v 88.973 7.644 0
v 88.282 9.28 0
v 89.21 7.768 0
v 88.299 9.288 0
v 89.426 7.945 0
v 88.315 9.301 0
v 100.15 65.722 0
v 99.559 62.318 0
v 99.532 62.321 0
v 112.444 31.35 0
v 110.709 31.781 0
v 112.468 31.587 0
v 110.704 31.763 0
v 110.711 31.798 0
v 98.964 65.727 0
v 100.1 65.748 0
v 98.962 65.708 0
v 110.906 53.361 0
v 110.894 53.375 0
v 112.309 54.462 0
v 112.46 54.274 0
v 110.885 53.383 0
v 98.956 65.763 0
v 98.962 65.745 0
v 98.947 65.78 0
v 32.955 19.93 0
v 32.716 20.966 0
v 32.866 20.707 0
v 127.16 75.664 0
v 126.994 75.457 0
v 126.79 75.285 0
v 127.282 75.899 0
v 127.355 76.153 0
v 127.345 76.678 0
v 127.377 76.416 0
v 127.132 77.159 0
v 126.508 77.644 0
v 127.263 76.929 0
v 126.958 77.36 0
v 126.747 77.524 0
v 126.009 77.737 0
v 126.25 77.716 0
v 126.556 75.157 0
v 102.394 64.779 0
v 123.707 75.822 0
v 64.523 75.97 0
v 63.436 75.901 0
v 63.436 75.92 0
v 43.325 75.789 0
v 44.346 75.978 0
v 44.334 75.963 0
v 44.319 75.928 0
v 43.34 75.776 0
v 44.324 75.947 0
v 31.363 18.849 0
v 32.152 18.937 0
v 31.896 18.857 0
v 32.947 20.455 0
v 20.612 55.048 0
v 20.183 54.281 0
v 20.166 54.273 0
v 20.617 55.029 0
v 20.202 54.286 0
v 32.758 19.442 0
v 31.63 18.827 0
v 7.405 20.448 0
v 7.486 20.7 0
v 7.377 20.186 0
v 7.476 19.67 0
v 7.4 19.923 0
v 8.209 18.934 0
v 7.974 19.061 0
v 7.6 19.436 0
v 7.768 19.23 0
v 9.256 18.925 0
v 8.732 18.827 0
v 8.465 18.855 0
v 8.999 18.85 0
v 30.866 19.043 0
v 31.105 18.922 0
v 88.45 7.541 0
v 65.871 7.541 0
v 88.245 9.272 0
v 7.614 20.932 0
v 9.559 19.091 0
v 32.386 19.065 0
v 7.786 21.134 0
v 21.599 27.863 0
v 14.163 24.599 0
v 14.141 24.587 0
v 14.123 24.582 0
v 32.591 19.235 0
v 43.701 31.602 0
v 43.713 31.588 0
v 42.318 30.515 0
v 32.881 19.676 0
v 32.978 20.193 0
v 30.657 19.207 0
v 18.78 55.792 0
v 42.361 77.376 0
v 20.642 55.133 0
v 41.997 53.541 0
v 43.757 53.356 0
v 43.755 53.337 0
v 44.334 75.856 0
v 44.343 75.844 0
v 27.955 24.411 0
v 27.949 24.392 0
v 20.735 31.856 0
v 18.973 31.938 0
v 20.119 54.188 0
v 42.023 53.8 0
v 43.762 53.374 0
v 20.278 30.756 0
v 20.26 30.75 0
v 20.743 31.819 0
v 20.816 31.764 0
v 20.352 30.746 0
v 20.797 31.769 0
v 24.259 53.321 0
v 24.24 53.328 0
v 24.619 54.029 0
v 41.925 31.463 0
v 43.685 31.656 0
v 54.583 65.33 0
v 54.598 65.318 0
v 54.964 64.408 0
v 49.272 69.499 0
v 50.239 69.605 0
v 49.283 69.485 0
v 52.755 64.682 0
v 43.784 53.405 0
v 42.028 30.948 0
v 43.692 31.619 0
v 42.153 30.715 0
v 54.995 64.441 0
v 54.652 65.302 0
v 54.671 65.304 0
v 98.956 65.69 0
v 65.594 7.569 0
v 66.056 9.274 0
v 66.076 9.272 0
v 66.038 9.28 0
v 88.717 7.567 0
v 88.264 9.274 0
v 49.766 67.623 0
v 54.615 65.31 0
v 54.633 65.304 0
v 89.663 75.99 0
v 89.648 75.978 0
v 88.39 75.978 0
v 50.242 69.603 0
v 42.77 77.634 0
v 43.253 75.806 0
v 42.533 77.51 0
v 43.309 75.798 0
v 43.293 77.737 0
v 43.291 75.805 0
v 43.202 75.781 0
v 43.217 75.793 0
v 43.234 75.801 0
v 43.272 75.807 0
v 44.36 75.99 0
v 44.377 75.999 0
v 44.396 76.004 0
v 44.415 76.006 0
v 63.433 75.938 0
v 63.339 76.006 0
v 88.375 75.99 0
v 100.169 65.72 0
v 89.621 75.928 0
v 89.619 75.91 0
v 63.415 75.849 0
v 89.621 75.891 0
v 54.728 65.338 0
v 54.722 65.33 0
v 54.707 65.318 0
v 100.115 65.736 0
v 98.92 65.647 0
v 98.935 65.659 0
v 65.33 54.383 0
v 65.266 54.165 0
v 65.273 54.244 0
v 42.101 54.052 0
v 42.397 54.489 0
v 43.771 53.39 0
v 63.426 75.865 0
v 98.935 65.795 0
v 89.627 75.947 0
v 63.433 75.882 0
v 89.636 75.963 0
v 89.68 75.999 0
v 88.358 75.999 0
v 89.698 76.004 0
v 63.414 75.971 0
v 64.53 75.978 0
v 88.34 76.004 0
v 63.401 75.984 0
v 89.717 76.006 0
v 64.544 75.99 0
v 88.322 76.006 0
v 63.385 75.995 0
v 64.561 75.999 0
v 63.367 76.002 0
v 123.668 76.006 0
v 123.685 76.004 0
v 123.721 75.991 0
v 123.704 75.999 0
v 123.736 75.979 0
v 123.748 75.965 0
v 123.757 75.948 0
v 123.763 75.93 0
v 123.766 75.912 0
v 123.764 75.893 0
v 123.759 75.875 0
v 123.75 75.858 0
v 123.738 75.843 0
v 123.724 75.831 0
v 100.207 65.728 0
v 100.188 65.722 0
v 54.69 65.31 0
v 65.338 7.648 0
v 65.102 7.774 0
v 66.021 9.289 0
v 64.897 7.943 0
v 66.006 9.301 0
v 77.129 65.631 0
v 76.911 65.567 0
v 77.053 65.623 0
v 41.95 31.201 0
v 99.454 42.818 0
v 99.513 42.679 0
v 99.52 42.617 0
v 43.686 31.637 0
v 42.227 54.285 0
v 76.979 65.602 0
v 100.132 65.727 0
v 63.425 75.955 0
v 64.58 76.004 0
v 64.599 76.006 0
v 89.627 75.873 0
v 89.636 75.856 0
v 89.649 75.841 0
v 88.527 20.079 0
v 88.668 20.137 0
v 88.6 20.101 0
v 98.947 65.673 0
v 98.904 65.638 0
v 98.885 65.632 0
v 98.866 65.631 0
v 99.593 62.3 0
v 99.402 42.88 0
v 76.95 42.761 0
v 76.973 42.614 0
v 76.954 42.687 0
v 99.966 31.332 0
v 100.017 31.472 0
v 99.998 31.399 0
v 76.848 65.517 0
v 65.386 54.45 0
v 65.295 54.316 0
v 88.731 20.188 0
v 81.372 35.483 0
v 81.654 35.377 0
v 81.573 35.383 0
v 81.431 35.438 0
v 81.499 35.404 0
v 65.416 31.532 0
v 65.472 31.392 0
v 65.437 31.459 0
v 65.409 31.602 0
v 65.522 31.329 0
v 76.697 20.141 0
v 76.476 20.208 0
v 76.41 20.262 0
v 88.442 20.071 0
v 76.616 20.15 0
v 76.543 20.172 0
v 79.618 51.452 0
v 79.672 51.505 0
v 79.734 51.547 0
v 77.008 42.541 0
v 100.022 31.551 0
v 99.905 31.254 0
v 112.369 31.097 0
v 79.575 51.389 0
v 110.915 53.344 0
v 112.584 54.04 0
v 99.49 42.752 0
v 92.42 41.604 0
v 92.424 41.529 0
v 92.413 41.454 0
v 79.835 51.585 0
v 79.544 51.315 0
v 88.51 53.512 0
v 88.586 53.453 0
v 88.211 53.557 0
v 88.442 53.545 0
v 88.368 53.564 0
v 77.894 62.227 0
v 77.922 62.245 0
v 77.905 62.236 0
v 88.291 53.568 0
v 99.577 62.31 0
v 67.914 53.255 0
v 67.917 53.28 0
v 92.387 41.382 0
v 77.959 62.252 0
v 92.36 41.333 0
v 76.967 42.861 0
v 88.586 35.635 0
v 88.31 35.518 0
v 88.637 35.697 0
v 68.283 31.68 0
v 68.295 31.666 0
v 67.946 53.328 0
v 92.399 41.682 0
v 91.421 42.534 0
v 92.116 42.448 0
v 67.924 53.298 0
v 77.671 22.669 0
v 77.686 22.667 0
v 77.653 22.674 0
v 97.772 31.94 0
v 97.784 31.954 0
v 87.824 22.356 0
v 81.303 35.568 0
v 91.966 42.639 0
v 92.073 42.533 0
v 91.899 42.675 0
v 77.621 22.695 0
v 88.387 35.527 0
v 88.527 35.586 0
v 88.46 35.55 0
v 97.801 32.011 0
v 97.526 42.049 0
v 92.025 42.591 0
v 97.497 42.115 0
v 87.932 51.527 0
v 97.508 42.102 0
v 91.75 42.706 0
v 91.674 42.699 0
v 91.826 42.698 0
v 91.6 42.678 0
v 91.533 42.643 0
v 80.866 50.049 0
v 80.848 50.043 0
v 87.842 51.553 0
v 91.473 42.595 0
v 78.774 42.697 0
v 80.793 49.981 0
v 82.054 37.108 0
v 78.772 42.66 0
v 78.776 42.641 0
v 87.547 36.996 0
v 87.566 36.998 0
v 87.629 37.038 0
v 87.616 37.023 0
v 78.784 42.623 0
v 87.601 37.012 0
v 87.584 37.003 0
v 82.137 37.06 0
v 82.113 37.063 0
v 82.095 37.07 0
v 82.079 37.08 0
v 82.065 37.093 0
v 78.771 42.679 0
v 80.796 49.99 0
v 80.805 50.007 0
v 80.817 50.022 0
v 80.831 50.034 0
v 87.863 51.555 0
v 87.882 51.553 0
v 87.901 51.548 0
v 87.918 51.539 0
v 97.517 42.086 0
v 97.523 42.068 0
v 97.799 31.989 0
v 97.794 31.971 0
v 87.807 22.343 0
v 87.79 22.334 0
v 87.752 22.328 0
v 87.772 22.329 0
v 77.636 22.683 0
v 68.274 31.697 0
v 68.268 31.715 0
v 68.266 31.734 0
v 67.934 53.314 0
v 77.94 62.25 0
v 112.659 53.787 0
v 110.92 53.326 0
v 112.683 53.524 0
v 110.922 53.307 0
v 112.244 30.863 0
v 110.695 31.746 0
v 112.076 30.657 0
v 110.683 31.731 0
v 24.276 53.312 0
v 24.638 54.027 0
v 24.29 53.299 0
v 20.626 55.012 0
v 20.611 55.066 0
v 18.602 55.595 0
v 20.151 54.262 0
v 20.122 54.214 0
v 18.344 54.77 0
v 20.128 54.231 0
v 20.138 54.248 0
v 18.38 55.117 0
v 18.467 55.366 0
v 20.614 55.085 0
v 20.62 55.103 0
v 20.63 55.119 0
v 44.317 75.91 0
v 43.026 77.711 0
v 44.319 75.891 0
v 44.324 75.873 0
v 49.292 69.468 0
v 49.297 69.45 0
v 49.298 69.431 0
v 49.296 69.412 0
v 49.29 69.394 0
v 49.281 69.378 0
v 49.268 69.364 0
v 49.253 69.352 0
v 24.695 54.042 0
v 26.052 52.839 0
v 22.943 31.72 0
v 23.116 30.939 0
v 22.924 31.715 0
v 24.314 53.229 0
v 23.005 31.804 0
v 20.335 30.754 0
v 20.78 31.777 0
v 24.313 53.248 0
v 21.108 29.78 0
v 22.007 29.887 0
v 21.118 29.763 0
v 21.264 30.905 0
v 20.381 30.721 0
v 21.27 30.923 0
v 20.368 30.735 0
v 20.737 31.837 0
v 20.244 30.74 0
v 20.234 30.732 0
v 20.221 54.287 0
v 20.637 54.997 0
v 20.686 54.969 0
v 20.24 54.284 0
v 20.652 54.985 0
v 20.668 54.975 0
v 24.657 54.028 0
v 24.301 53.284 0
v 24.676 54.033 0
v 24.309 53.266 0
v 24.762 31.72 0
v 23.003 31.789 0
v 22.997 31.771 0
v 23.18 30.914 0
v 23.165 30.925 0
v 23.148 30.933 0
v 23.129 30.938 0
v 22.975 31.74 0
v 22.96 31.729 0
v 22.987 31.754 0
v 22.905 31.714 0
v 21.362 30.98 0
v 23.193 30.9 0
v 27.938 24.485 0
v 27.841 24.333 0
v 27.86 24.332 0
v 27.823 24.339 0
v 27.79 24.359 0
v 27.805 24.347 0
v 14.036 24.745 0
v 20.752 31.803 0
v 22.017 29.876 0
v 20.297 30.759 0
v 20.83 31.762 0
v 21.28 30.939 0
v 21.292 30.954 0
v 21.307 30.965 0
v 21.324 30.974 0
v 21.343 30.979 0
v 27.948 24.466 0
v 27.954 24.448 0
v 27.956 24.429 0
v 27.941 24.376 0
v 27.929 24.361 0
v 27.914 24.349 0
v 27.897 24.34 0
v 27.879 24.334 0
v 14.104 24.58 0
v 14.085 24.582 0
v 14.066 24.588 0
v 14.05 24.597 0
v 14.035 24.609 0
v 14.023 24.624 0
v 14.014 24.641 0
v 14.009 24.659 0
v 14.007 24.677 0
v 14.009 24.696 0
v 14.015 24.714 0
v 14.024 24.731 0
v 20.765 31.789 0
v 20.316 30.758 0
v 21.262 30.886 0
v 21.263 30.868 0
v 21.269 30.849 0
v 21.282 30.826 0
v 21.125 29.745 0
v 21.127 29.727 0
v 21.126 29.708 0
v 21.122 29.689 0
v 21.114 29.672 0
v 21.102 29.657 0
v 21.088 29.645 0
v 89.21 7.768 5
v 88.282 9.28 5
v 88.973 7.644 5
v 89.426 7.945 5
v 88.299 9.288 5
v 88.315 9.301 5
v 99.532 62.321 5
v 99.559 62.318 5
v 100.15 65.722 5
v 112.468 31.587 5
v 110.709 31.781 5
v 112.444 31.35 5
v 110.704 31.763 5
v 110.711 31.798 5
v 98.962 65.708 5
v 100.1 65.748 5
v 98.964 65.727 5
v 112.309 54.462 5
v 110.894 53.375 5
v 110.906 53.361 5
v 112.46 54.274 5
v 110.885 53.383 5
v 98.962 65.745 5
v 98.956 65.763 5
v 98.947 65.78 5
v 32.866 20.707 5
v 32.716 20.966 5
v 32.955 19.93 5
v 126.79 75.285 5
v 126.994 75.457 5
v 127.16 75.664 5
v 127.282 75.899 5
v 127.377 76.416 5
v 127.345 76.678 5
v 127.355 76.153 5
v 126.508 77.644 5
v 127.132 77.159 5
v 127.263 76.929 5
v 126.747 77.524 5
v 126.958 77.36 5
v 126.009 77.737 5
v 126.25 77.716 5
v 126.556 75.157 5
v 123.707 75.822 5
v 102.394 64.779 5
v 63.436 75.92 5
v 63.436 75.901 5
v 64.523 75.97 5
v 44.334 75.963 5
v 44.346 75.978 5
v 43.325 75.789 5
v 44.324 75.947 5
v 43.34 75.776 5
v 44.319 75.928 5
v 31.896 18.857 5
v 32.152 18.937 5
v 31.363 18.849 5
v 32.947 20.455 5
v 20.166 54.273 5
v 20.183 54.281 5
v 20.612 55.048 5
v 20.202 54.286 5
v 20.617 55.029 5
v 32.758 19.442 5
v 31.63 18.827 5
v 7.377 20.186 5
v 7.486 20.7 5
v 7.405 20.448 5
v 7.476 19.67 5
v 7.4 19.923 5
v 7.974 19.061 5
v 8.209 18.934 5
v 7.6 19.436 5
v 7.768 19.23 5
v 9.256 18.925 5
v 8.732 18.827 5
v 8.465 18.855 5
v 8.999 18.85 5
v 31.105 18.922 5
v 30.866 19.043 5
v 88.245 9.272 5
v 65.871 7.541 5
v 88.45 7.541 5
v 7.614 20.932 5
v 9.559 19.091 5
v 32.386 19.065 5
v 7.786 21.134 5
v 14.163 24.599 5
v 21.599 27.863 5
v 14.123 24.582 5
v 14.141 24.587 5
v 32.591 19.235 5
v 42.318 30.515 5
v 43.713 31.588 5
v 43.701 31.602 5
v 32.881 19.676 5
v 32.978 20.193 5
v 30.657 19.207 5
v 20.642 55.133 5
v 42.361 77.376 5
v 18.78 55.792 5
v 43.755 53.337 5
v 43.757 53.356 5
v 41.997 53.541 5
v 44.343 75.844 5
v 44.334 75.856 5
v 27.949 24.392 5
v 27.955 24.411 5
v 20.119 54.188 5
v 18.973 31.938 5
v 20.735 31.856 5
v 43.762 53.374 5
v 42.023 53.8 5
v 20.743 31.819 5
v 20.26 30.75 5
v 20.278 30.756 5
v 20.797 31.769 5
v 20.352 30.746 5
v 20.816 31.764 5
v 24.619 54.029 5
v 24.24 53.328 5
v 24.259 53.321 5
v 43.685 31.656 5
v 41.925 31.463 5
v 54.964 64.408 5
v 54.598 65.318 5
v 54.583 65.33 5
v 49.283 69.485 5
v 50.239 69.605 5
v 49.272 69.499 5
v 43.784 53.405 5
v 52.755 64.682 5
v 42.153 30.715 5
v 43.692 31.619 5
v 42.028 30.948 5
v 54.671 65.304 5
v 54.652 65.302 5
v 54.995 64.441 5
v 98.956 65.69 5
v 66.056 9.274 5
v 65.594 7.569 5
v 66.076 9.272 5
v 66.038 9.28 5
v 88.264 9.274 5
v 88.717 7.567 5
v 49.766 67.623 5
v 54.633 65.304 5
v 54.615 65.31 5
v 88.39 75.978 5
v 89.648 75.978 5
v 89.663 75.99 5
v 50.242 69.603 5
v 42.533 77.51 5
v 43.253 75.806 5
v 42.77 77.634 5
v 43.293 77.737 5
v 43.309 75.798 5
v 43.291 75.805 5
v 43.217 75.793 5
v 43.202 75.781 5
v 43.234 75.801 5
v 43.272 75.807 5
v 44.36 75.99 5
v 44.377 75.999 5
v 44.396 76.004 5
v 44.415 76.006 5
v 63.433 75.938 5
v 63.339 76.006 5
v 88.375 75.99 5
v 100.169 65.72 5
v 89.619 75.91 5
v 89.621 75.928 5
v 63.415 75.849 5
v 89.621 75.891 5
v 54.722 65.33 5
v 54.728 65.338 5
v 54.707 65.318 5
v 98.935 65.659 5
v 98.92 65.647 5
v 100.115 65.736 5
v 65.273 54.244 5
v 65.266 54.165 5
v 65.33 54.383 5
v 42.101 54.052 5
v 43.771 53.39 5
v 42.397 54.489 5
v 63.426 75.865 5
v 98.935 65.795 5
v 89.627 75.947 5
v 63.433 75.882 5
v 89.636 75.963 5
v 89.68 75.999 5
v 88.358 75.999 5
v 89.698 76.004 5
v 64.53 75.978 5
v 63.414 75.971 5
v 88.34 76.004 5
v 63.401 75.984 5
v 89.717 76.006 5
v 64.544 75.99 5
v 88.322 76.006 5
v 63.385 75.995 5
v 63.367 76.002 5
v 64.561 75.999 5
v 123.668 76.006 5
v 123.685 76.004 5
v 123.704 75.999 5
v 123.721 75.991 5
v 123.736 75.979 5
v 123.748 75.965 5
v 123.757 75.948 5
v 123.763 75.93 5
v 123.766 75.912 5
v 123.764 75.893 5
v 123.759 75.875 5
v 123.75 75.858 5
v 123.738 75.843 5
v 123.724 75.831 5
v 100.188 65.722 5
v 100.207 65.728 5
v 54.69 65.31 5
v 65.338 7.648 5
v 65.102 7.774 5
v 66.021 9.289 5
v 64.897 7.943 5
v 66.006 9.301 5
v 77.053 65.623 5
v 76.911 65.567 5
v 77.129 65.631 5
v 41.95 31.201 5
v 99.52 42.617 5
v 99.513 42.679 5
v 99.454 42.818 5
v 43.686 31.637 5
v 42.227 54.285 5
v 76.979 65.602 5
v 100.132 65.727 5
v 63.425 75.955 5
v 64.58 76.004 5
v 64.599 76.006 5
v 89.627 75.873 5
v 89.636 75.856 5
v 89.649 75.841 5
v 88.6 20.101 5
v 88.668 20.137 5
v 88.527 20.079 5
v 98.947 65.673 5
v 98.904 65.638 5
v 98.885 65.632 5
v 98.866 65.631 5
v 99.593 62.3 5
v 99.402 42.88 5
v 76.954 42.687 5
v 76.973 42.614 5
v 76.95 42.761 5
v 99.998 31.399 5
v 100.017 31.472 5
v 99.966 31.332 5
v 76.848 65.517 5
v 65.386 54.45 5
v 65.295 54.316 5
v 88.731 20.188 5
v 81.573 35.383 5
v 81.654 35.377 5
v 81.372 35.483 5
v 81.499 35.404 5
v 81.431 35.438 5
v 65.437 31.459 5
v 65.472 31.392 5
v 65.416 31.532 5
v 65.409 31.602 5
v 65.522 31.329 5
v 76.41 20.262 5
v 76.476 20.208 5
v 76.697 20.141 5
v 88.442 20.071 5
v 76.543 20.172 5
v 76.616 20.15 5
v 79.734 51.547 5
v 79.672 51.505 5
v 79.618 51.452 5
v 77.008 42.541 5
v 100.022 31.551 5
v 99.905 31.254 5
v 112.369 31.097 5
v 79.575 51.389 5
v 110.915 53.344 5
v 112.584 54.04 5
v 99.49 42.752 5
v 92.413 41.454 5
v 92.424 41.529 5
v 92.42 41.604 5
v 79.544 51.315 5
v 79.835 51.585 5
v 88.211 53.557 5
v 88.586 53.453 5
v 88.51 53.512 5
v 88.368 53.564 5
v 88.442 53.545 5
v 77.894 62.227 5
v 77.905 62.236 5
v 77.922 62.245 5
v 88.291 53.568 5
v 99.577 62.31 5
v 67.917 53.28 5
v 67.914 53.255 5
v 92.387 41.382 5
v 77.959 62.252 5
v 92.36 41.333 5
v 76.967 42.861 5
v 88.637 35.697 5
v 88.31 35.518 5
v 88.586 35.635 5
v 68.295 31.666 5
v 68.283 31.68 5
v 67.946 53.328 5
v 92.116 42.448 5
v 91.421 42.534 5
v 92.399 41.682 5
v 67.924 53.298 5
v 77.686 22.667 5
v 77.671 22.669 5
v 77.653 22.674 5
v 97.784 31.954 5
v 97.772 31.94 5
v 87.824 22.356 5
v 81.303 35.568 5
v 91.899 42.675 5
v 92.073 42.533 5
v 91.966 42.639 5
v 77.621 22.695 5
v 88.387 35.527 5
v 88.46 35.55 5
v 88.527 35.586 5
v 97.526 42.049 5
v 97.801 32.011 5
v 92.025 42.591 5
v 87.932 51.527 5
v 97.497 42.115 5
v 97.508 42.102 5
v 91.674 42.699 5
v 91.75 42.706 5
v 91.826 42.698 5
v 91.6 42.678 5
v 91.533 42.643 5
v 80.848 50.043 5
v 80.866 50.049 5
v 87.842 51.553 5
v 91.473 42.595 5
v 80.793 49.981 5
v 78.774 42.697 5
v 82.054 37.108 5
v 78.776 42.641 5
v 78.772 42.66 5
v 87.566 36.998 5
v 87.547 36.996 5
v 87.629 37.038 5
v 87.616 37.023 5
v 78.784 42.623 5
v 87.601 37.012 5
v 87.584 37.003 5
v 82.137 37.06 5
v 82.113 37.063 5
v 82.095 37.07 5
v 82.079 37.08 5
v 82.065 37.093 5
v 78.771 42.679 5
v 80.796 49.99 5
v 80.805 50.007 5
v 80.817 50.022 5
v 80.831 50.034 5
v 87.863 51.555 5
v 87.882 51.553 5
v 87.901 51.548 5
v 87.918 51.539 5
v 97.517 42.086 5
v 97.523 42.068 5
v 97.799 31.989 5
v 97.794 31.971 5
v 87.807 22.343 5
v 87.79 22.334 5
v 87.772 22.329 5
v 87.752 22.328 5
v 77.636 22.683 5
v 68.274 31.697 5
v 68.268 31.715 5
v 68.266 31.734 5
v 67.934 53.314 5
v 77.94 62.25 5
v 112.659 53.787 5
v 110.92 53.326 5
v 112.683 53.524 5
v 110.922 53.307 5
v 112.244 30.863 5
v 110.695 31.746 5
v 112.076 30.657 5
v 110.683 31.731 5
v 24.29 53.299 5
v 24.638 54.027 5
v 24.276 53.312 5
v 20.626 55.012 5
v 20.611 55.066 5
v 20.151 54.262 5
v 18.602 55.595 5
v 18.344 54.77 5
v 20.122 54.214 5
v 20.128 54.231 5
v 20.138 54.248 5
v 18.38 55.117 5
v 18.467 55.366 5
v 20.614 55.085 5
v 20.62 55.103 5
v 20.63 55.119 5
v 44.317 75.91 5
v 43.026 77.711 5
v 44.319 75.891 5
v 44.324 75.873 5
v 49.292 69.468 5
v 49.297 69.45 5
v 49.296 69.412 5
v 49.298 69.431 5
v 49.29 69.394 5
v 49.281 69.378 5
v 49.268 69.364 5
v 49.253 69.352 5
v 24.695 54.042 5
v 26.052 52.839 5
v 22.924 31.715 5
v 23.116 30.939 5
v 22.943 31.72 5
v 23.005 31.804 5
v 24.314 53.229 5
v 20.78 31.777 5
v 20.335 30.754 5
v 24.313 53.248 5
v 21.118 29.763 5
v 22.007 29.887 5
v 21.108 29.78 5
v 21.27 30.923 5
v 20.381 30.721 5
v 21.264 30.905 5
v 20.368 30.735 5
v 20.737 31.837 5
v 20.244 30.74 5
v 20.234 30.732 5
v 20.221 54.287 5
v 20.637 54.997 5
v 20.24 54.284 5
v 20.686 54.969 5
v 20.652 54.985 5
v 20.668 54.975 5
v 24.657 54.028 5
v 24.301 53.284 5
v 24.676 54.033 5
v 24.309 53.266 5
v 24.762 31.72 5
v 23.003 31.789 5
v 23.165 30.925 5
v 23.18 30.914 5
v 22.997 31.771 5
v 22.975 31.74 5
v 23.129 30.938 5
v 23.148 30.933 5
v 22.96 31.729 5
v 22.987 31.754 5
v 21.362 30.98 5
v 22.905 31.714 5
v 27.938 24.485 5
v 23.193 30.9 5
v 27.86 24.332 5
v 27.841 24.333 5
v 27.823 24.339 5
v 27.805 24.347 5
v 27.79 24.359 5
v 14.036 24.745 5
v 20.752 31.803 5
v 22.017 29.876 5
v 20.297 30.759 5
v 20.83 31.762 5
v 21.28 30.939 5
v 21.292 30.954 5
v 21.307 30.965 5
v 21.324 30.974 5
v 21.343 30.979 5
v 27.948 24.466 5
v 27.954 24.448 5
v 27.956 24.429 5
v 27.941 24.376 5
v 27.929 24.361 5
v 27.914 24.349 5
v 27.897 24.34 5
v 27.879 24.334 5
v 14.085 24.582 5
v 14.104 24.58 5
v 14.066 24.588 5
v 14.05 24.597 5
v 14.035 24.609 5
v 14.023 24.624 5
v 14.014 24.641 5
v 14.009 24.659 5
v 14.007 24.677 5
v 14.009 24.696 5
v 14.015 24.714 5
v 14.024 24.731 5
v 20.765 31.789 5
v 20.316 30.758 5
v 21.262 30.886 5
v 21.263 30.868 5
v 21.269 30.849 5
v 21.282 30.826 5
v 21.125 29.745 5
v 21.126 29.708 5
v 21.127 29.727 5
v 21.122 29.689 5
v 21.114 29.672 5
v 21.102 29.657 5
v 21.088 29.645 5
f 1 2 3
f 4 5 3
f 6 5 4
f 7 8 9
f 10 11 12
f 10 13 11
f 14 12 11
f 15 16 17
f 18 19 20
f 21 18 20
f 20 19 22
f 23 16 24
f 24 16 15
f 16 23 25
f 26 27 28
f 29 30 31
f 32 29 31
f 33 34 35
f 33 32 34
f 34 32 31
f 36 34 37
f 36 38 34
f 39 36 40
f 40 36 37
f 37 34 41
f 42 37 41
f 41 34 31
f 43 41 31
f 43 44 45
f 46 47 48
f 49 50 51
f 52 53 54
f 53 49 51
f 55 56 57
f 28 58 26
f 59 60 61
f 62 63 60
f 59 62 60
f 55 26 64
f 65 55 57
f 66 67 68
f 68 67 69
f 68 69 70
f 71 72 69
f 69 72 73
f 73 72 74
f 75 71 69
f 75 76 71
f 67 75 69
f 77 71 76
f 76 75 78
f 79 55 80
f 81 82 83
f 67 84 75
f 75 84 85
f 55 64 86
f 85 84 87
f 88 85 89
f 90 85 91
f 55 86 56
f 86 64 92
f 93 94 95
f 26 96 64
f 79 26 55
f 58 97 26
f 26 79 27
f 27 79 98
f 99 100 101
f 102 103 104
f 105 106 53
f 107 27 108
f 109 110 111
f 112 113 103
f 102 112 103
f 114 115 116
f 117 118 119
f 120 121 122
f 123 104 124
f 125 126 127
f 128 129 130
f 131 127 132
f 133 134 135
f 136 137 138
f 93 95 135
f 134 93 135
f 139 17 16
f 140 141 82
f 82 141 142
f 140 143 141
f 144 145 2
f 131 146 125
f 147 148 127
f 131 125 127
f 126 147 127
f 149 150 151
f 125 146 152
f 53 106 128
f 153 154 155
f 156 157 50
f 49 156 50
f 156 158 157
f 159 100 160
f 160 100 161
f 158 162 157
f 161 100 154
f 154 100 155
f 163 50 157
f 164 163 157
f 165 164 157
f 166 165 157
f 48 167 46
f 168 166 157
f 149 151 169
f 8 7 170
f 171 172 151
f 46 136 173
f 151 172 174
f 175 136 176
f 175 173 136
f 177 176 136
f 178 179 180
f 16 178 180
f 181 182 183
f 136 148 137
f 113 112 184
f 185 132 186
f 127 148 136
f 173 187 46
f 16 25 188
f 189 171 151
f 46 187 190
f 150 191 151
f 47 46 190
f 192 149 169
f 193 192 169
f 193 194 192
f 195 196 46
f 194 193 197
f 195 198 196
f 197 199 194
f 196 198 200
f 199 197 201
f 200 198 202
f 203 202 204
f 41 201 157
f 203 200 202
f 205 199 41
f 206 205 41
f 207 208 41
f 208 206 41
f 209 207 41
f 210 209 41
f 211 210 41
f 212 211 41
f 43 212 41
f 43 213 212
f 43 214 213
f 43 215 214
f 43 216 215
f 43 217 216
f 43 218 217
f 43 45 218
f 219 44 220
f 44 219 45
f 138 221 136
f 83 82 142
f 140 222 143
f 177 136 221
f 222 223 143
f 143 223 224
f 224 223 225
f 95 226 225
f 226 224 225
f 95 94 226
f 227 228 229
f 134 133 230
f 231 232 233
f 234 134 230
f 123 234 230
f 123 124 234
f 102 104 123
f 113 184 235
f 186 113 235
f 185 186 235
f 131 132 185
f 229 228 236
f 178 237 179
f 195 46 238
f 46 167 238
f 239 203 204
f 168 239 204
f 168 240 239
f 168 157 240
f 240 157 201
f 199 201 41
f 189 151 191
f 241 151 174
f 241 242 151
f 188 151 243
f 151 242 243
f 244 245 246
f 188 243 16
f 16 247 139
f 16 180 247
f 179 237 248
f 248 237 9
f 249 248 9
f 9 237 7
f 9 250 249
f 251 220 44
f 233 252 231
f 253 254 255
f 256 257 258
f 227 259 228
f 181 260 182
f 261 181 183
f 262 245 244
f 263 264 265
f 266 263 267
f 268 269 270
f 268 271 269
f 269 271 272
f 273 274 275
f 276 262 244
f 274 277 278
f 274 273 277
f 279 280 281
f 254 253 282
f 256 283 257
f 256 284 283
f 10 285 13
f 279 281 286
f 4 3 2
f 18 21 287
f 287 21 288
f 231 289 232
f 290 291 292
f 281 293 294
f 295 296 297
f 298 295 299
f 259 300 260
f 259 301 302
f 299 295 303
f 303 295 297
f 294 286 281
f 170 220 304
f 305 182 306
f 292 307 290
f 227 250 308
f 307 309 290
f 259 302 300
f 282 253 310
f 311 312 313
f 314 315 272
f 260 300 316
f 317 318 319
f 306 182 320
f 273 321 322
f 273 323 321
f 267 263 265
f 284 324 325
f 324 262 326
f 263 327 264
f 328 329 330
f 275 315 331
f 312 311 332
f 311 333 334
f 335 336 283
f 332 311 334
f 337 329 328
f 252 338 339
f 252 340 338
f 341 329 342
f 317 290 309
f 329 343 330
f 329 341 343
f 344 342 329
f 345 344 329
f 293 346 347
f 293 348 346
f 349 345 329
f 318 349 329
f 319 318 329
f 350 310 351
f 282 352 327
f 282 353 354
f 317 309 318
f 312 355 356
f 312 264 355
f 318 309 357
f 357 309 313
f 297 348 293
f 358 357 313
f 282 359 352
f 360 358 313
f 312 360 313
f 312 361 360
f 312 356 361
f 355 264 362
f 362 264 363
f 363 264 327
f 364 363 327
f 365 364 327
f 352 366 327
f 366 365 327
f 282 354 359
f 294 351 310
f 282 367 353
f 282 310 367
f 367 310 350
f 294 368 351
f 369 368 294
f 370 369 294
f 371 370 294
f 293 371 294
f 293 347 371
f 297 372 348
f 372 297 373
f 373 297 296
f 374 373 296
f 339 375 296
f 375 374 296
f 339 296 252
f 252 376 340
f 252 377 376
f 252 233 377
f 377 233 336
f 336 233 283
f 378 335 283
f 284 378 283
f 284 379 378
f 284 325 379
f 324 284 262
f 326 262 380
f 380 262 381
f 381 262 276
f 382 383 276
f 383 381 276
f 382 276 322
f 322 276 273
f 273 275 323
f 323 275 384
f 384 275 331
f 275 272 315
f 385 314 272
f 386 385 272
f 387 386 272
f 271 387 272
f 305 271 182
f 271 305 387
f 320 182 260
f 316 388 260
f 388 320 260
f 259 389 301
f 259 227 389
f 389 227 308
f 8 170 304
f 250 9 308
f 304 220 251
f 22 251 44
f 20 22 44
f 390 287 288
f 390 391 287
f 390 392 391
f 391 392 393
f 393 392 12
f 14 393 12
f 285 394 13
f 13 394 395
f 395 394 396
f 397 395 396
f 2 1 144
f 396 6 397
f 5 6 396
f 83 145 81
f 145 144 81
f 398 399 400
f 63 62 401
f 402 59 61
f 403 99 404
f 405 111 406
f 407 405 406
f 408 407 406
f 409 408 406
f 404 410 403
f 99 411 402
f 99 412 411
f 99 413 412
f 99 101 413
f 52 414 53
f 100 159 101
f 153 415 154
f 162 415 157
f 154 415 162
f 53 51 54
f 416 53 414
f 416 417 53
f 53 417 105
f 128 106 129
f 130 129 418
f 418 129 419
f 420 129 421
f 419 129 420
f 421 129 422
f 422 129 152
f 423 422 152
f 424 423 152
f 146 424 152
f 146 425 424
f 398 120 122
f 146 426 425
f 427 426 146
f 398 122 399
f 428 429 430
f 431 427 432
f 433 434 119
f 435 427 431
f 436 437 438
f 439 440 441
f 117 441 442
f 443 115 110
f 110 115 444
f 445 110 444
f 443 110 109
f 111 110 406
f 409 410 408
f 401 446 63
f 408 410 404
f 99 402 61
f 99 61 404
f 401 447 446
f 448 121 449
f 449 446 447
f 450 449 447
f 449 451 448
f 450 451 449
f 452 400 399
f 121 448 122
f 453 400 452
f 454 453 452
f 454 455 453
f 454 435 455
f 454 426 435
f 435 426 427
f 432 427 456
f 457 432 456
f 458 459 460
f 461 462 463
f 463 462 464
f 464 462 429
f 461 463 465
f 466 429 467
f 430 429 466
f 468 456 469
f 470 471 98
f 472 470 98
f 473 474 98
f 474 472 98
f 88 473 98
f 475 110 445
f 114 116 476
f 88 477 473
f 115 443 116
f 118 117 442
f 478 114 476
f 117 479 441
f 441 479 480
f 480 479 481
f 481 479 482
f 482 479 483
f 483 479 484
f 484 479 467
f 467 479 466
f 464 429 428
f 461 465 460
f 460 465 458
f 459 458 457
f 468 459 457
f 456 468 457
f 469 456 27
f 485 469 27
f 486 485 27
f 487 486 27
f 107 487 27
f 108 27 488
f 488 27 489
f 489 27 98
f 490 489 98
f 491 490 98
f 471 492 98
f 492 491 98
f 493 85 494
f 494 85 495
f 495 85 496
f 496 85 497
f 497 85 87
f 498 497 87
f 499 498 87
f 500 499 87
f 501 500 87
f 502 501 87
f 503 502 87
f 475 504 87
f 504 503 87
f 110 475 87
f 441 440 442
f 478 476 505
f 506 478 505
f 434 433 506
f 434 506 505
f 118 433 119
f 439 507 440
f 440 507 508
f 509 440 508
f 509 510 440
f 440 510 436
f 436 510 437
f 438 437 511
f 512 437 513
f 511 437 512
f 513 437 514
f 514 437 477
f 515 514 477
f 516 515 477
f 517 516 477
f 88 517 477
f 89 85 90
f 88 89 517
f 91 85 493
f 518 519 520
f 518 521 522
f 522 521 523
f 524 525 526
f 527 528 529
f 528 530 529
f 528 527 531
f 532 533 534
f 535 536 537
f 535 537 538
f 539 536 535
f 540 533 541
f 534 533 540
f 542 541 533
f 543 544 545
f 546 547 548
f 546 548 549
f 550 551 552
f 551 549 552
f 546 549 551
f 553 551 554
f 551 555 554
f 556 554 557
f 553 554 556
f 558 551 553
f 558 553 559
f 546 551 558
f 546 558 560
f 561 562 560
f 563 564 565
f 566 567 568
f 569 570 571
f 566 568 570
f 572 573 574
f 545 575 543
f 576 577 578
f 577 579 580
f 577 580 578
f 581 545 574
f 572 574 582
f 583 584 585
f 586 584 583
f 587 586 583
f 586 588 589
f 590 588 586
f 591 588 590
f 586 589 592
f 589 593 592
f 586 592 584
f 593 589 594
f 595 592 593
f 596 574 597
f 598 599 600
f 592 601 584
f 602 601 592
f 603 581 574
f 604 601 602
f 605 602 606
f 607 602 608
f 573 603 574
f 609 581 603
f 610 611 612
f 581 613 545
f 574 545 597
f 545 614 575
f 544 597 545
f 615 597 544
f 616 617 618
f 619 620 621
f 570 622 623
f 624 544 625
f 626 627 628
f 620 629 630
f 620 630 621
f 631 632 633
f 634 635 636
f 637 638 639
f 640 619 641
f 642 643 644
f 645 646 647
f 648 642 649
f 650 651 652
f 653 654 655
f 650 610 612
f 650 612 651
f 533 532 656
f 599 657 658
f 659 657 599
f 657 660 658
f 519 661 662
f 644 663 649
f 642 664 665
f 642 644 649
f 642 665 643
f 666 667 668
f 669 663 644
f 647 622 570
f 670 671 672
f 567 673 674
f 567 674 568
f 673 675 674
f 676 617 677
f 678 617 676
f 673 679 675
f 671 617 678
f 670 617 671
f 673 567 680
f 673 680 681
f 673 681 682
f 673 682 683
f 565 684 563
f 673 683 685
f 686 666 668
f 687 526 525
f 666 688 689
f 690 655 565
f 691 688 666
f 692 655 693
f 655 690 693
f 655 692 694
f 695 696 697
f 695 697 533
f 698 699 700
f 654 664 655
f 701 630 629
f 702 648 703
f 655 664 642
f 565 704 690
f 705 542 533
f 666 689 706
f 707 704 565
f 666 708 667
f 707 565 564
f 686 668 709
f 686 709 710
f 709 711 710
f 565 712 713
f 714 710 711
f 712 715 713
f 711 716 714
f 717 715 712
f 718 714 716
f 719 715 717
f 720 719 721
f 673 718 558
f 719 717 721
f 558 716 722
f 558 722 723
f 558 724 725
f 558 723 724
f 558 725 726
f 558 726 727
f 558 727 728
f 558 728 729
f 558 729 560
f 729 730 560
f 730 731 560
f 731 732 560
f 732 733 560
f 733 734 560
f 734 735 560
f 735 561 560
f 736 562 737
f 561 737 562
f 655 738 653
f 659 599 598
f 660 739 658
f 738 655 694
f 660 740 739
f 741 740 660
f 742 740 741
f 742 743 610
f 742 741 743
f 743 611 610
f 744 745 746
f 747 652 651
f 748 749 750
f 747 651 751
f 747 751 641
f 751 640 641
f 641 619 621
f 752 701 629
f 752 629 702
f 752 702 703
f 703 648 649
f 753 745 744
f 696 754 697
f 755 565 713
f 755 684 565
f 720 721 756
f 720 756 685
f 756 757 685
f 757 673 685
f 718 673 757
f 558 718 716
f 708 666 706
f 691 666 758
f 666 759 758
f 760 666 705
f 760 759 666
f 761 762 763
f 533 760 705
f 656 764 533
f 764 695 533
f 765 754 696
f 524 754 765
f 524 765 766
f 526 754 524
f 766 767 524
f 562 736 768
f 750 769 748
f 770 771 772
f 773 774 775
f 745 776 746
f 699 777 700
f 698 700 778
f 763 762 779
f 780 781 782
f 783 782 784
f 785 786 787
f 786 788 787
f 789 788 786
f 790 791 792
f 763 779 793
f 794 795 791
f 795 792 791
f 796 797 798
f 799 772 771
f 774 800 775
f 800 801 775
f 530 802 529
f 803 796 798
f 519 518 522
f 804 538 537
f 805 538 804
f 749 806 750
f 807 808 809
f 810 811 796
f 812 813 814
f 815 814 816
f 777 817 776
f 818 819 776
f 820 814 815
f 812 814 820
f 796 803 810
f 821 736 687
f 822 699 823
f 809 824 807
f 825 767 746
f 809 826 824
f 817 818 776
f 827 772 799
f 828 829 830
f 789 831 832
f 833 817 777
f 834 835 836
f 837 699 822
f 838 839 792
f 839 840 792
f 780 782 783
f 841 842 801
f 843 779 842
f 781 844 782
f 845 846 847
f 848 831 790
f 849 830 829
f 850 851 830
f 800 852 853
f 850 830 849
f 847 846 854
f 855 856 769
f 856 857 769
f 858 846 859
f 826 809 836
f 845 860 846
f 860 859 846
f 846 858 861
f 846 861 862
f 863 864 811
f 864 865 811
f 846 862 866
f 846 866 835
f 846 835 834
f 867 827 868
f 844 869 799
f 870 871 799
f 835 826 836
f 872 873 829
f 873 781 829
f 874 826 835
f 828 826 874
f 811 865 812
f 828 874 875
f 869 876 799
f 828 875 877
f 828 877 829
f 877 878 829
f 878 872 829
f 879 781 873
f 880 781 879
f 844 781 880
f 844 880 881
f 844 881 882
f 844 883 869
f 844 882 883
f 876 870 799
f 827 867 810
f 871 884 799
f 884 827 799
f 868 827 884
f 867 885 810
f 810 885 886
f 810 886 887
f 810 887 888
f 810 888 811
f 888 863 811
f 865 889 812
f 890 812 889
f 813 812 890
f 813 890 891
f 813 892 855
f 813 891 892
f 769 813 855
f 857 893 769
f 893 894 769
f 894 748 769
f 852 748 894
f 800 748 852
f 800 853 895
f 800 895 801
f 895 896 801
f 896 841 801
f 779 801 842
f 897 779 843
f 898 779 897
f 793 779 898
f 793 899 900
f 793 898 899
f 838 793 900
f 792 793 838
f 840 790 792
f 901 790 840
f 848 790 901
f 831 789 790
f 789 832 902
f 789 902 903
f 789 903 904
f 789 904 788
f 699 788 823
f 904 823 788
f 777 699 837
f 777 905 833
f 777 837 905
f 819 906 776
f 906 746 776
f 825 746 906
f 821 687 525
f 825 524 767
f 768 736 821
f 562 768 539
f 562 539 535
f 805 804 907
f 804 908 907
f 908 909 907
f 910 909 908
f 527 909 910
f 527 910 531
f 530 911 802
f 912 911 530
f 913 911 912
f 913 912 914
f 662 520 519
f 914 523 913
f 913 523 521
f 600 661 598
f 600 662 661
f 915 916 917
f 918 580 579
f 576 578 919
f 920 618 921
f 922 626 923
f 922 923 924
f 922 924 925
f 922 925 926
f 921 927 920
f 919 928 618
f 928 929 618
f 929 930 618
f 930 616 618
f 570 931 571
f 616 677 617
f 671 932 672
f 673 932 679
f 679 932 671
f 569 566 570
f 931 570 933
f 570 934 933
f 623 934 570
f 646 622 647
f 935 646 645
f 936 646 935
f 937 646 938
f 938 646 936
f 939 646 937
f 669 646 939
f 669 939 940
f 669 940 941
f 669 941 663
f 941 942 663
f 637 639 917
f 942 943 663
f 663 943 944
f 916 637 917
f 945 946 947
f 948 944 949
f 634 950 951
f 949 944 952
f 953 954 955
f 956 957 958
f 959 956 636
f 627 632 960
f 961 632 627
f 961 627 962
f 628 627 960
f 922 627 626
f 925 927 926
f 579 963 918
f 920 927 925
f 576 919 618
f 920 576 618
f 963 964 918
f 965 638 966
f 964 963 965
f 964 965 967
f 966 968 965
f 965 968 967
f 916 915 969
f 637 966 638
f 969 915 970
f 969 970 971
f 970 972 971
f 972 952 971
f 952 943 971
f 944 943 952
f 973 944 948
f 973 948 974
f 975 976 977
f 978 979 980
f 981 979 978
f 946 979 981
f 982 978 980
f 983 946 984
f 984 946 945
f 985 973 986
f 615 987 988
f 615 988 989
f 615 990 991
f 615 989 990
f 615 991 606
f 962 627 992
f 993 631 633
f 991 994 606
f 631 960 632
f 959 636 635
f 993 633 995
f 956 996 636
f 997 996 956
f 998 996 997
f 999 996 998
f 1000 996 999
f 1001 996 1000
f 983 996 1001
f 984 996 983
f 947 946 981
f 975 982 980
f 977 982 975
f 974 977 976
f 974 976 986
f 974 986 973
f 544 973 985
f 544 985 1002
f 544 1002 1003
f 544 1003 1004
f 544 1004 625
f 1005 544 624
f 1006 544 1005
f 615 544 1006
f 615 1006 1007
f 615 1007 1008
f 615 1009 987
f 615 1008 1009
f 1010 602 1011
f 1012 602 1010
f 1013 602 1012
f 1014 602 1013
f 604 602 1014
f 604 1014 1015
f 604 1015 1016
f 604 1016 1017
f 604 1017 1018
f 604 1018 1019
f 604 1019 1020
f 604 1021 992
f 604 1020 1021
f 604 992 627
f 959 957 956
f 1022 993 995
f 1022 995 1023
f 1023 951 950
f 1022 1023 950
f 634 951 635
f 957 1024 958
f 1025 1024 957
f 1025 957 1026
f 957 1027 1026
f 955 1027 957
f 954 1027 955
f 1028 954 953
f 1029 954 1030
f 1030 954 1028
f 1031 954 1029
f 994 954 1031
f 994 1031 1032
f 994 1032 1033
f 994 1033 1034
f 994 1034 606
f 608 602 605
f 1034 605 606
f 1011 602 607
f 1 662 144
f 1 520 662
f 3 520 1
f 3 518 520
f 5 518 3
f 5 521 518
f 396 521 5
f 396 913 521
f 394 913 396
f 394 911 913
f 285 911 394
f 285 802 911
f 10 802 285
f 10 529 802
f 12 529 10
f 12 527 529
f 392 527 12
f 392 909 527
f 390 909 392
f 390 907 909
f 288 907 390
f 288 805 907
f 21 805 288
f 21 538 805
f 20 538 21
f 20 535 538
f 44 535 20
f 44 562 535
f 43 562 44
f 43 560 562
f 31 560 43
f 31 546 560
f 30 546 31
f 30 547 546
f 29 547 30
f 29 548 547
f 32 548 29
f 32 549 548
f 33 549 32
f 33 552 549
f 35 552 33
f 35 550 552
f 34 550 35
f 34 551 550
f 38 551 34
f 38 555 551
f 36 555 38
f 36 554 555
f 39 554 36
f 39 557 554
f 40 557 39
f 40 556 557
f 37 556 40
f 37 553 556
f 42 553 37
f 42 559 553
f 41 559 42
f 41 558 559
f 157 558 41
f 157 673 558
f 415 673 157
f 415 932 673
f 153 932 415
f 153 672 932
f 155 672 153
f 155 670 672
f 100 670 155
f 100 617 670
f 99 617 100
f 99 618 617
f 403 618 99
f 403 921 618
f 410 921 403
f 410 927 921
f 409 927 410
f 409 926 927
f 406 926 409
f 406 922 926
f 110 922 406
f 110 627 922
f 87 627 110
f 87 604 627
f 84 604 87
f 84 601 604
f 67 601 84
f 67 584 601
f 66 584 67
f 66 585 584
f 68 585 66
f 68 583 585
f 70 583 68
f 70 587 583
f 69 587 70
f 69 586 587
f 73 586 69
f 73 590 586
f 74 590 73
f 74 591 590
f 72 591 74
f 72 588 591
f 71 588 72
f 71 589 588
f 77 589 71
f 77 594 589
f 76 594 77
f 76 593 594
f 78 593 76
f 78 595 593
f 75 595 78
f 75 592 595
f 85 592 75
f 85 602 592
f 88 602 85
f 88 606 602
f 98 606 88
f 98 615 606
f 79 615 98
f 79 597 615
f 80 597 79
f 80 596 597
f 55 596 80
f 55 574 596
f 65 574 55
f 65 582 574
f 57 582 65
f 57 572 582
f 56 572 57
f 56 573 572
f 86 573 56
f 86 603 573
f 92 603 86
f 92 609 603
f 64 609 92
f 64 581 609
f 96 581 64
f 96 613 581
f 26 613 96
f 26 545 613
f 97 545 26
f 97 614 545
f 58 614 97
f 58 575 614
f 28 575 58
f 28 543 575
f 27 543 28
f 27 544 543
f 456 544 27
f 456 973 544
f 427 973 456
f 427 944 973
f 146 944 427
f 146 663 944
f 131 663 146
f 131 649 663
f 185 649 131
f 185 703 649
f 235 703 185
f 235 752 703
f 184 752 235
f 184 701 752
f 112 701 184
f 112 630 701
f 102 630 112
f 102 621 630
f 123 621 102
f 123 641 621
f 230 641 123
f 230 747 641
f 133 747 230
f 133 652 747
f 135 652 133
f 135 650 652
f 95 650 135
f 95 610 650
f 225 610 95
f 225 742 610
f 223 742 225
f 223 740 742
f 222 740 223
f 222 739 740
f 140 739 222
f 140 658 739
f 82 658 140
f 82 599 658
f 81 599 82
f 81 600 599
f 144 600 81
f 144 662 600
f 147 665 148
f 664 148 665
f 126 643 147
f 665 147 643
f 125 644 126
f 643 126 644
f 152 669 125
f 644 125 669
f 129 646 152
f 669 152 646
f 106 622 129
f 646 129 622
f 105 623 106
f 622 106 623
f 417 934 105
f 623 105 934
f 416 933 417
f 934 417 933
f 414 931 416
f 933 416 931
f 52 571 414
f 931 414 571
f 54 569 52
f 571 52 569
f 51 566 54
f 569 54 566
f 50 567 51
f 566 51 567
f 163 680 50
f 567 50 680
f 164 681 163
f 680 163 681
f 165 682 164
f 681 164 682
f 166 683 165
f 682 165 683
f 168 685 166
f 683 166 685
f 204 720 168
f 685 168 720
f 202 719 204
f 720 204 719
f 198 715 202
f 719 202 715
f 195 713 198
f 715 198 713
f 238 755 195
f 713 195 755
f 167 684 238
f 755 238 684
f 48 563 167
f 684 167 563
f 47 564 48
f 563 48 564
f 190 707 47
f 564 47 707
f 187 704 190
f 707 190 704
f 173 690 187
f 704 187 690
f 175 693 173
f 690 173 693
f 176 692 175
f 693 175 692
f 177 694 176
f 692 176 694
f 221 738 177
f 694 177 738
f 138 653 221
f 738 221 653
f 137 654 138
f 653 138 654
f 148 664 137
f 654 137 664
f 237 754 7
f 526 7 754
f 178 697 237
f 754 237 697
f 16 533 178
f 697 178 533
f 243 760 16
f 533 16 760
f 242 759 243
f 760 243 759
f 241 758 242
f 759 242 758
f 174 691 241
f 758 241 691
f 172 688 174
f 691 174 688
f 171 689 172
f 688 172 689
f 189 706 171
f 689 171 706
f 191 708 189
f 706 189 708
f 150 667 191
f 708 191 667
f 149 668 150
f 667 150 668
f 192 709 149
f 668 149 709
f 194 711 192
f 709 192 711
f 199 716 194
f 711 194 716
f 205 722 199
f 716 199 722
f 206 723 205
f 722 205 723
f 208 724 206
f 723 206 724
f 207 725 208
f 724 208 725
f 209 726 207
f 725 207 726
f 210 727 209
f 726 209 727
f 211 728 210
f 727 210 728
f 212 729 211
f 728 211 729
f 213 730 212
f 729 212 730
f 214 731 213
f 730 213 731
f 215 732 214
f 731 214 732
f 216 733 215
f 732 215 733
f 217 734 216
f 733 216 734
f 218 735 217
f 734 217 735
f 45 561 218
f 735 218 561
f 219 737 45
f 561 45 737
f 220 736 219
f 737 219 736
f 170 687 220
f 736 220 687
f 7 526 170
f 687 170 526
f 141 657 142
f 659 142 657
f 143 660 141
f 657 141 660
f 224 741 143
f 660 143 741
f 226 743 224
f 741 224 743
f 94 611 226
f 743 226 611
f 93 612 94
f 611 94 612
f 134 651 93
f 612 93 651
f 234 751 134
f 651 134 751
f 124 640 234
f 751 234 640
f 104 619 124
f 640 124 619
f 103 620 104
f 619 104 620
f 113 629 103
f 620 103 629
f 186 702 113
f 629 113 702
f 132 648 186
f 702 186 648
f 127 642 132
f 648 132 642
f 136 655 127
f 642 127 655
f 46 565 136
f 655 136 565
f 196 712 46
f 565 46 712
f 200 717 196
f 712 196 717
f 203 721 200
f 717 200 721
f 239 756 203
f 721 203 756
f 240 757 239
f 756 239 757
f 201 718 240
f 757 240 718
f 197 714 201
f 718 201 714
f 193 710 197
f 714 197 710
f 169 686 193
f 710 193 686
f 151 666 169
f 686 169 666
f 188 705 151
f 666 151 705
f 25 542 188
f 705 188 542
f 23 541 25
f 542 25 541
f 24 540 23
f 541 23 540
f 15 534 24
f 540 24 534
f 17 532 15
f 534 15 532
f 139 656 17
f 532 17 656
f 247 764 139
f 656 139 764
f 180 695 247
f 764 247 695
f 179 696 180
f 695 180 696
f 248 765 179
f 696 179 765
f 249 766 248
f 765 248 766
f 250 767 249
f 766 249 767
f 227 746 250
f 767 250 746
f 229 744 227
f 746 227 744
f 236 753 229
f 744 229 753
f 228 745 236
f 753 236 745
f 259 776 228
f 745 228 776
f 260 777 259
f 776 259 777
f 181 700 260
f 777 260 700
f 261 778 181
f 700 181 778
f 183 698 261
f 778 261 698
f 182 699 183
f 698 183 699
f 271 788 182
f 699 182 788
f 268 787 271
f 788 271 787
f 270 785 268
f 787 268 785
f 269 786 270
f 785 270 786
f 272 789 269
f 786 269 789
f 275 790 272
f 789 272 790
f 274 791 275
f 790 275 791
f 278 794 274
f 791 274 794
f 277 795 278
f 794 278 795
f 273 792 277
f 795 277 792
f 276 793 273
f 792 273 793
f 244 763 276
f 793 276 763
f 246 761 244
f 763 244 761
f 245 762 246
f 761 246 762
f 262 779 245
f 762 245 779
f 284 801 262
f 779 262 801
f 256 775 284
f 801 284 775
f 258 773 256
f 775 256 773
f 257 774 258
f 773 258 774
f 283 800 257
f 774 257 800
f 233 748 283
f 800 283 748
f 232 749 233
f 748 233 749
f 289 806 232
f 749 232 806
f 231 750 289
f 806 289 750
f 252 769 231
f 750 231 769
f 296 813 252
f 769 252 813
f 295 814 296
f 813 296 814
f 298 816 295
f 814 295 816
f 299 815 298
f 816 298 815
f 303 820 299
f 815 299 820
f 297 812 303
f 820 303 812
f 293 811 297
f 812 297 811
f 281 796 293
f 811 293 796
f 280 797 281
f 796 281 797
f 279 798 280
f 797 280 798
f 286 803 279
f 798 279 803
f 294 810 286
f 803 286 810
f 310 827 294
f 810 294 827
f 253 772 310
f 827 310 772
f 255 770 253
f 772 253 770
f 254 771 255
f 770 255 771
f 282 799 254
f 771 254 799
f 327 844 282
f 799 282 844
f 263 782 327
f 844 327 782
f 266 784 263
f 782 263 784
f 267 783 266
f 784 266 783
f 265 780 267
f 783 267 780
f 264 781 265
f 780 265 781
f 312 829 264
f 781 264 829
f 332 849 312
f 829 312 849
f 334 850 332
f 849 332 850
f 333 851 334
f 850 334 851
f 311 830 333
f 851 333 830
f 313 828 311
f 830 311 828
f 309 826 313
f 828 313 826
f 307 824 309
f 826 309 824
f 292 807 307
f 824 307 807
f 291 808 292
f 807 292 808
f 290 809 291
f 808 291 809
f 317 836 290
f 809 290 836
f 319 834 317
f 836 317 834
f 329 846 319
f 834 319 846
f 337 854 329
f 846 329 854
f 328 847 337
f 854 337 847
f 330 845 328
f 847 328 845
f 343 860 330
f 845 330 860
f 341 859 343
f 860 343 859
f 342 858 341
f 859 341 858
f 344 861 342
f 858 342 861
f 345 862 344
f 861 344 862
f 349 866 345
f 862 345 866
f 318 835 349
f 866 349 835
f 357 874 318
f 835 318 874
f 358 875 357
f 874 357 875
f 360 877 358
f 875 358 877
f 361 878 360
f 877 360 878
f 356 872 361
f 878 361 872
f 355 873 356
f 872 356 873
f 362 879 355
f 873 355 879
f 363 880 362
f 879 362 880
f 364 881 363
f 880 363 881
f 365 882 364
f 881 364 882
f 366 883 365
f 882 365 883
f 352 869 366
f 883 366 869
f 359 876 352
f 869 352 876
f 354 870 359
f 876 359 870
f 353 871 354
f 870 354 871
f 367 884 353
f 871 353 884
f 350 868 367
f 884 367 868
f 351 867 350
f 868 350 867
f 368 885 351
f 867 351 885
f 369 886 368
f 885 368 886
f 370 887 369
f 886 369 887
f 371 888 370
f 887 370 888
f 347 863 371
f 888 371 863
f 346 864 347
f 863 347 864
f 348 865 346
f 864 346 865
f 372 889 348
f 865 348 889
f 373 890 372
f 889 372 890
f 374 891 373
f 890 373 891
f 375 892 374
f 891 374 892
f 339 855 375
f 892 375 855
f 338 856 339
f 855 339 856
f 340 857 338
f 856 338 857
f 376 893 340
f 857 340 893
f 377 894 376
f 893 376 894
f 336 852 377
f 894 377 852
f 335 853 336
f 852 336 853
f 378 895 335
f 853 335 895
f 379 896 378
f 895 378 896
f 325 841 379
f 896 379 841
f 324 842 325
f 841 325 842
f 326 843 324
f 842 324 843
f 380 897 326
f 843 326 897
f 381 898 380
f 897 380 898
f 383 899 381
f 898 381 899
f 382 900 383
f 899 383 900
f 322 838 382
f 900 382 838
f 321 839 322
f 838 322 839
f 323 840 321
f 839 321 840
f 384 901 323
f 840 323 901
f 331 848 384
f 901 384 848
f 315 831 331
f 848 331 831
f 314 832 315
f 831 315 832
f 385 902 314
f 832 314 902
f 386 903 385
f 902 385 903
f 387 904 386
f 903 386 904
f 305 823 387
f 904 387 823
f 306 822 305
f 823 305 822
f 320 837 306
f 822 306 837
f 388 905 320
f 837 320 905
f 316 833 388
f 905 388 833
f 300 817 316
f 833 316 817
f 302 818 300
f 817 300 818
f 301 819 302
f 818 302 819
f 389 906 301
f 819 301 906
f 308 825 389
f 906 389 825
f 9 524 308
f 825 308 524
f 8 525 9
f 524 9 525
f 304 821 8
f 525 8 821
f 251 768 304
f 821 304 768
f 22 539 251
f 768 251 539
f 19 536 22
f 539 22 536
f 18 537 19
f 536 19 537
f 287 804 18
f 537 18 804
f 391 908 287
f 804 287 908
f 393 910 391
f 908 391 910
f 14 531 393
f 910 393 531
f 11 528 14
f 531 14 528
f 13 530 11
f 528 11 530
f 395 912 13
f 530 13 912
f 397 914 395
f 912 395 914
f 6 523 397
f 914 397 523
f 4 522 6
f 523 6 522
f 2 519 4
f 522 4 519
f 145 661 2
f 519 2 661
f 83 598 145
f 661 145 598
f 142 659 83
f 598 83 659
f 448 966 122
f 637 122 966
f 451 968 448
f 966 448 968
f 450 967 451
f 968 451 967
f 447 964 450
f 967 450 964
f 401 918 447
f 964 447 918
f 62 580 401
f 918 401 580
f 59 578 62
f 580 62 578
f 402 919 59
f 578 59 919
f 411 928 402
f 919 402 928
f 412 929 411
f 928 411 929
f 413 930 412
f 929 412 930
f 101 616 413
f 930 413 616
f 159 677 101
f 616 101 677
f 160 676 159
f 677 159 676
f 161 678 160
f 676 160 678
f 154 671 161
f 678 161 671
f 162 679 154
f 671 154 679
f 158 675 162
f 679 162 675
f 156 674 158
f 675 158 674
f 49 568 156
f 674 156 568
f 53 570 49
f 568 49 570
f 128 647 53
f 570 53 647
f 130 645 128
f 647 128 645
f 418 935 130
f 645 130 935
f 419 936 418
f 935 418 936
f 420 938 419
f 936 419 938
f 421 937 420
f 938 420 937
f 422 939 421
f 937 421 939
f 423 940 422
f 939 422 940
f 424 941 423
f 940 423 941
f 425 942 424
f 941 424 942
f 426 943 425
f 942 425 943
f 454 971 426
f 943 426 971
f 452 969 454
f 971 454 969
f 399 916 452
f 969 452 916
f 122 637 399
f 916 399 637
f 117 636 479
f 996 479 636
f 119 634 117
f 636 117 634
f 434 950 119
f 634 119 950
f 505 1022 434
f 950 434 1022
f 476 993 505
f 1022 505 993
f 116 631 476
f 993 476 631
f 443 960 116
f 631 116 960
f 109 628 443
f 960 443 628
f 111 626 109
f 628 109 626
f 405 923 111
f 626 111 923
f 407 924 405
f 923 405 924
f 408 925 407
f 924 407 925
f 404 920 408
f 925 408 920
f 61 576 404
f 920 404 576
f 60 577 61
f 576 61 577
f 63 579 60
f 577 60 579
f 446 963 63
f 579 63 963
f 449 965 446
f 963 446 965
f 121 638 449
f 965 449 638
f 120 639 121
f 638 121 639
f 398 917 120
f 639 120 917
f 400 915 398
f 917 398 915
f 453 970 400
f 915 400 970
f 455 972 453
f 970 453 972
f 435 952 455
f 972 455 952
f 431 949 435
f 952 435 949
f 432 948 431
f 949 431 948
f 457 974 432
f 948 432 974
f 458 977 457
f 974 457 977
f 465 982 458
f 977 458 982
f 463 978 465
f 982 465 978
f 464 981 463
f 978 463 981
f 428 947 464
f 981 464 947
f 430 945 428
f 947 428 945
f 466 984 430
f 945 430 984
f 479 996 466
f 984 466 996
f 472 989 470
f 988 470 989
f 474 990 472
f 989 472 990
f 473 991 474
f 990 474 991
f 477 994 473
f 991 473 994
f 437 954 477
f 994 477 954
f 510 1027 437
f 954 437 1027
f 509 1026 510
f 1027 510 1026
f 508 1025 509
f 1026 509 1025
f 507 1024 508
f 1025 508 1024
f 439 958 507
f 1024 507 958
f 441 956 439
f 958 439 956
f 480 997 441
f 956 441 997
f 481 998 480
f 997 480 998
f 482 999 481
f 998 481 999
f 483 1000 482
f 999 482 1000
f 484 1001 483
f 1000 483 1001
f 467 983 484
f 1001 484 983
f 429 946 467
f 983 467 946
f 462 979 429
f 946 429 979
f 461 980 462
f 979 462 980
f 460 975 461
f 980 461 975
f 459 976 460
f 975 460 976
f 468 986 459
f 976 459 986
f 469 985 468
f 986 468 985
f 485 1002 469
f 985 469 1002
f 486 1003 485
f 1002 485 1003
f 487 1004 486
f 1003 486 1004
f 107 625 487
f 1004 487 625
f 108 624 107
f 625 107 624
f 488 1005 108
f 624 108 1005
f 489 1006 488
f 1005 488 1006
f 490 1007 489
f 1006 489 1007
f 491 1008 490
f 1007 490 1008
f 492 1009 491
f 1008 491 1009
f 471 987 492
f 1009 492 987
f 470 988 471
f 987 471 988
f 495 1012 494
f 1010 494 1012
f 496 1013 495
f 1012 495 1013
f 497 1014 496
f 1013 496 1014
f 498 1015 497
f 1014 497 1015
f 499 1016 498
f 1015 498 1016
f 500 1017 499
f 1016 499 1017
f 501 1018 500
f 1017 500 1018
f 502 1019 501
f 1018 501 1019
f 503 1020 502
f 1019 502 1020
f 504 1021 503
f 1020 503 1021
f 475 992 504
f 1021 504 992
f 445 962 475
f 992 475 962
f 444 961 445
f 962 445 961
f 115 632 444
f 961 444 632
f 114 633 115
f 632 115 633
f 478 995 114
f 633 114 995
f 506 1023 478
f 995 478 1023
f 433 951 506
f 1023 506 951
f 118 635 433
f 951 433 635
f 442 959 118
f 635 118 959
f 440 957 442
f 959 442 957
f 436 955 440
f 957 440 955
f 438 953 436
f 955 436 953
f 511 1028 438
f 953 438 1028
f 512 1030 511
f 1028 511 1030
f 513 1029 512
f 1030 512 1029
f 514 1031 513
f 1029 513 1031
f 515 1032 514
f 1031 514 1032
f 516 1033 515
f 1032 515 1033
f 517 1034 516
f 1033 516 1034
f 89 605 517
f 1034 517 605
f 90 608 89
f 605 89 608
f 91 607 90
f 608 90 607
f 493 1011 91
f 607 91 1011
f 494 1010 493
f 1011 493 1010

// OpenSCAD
/*
 * Customizable Origami - Snail - https://www.thingiverse.com/thing:2667432
 * by Dennis Hofmann - https://www.thingiverse.com/mightynozzle/about
 * created 2017-11-25
 * version v1.0
 *
 * Changelog
 * --------------
 * v1.0:
 *      - final design
 * --------------
 * 
 * This work is licensed under the Creative Commons - Attribution - NonCommercial - ShareAlike license.
 * https://creativecommons.org/licenses/by-nc-sa/3.0/
 */


 // Parameter Section //
//-------------------//

// preview[view:north, tilt:top]

// The maximum size of the longest side. The shorter side will be automatically resized in same ratio.
max_size_in_millimeter = 120; //[20:300]

// The height of the model.
model_height_in_millimeter = 5; //[0.2:0.2:100]

// Thickness of the outer outline.
outline_size_in_millimeter = 1.8; //[0.5:0.1:20]

// Thickness of the inner outline.
inline_size_in_millimeter = 0.8; //[0.5:0.1:20]

// Roundiness of the ends of the inner outlines.
inline_edge_radius_in_millimeter = 0.1; //[0.0:0.1:5]

// Flip model
flip_model = "no"; //[yes,no]

/*[hidden]*/
max_size = max_size_in_millimeter;
model_height = model_height_in_millimeter;
$fn=32;

// Outer Points
A1 = [345, 760];
A2 = [697, 983];
A3 = [763, 917];
A4 = [605, 759];
A5 = [604, 446];
A6 = [919, 126];
A7 = [1234, 126];
A8 = [1550, 448];
A9 = [1553, 759];
A10 = [1396, 925];
A11 = [1758, 1083];
A12 = [1235, 1083];
A13 = [898, 1083];
A14 = [604, 1083];
A15 = [275, 777];
A16 = [284, 445];
A17 = [122, 286];
A18 = [303, 420];
A19 = [441, 286];
A20 = [326, 444];

outline = [A1, A2, A3, A4, A5, A6, A7, A8, A9, A10, A11, A12, A13, A14, A15, A16, A17, A18, A19, A20];

// Inner Points
B1 = [1076, 925];
B2 = [916, 768];
B3 = [918, 448];
B4 = [1070, 291];
B5 = [1234, 290];
B6 = [1390, 447];
B7 = [1383, 604];
B8 = [1232, 754];
B9 = [1079, 606];
B10 = [1139, 507];
B11 = [1232, 509];
B12 = [1284, 589];
B13 = [1280, 600];
B14 = [1225, 519];
B15 = [1142, 520];
B16 = [1093, 604];
B17 = [1228, 737];
B18 = [1366, 599];
B19 = [1370, 451];
B20 = [1227, 311];
B21 = [1081, 316];
B22 = [947, 447];
B23 = [942, 758];
B24 = [1085, 888];
B25 = [1391, 889];
B26 = [1115, 726];
B27 = [1123, 714];

// Polygons
C1 = [A17, A16, A18];
C2 = [A16, A18, A19, A20];
C3 = [A16, A15, A1, A20];
C4 = [A15, A14, A2, A1];
C5 = [A14, A13, A3, A2];
C6 = [A12, A10, A11];
C7 = [B13, B14, B15, B16, B27, B17, B18, B19, B20, B21, B22, B23, B24, B25, A9, A8, A7, A6, A5, A4, A3, A13, A12, A10, B1, B2, B3, B4, B5, B6, B7, B8, B26, B9, B10, B11, B12];

cut_polygons = [C1, C2, C3, C4, C5, C6, C7];

min_x = A17[0];
min_y = A6[1];
max_x = A11[0];
max_y = A11[1];

x_size = max_x - min_x;
y_size = max_y - min_y;

x_factor = max_size / x_size;
y_factor = max_size / y_size;

inline_size = x_size > y_size ? inline_size_in_millimeter / x_factor / 2: inline_size_in_millimeter / y_factor / 2;
inline_edge_radius = x_size > y_size ? inline_edge_radius_in_millimeter / x_factor: inline_edge_radius_in_millimeter / y_factor;
outline_size = x_size > y_size ? outline_size_in_millimeter / x_factor - inline_size: outline_size_in_millimeter / y_factor - inline_size;


 // Program Section //
//-----------------//

if(x_size > y_size) {
    resize(newsize=[max_size, x_factor * y_size, model_height]){
        if(flip_model == "yes") {
            mirror([0,1,0]) {
                rotate([180,180,0]) {    
                    create(outline, cut_polygons);
                }
            }
        } else {
            create(outline, cut_polygons);
        }
    }
} else {
    resize(newsize=[y_factor * x_size, max_size, model_height]){
        if(flip_model == "yes") {
            mirror([0,1,0]) {
                rotate([180,180,0]) {    
                    create(outline, cut_polygons);
                }
            }
        } else {
            create(outline, cut_polygons);
        }
    }
}


 // Module Section //
//----------------//

module create() {
    linear_extrude(height=1) {
        difference() {
            offset(r = -0) {
                offset(r = +outline_size) {
                    polygon(points = outline, convexity = 10);
                }
            }
            
            for(cut_polygon = [0:len(cut_polygons)]) {
                offset(r = +inline_edge_radius) {
                    offset(r = -inline_size - inline_edge_radius) {
                        polygon(points = cut_polygons[cut_polygon], convexity = 10);
                    }
                }
            }
        }
    }
}
